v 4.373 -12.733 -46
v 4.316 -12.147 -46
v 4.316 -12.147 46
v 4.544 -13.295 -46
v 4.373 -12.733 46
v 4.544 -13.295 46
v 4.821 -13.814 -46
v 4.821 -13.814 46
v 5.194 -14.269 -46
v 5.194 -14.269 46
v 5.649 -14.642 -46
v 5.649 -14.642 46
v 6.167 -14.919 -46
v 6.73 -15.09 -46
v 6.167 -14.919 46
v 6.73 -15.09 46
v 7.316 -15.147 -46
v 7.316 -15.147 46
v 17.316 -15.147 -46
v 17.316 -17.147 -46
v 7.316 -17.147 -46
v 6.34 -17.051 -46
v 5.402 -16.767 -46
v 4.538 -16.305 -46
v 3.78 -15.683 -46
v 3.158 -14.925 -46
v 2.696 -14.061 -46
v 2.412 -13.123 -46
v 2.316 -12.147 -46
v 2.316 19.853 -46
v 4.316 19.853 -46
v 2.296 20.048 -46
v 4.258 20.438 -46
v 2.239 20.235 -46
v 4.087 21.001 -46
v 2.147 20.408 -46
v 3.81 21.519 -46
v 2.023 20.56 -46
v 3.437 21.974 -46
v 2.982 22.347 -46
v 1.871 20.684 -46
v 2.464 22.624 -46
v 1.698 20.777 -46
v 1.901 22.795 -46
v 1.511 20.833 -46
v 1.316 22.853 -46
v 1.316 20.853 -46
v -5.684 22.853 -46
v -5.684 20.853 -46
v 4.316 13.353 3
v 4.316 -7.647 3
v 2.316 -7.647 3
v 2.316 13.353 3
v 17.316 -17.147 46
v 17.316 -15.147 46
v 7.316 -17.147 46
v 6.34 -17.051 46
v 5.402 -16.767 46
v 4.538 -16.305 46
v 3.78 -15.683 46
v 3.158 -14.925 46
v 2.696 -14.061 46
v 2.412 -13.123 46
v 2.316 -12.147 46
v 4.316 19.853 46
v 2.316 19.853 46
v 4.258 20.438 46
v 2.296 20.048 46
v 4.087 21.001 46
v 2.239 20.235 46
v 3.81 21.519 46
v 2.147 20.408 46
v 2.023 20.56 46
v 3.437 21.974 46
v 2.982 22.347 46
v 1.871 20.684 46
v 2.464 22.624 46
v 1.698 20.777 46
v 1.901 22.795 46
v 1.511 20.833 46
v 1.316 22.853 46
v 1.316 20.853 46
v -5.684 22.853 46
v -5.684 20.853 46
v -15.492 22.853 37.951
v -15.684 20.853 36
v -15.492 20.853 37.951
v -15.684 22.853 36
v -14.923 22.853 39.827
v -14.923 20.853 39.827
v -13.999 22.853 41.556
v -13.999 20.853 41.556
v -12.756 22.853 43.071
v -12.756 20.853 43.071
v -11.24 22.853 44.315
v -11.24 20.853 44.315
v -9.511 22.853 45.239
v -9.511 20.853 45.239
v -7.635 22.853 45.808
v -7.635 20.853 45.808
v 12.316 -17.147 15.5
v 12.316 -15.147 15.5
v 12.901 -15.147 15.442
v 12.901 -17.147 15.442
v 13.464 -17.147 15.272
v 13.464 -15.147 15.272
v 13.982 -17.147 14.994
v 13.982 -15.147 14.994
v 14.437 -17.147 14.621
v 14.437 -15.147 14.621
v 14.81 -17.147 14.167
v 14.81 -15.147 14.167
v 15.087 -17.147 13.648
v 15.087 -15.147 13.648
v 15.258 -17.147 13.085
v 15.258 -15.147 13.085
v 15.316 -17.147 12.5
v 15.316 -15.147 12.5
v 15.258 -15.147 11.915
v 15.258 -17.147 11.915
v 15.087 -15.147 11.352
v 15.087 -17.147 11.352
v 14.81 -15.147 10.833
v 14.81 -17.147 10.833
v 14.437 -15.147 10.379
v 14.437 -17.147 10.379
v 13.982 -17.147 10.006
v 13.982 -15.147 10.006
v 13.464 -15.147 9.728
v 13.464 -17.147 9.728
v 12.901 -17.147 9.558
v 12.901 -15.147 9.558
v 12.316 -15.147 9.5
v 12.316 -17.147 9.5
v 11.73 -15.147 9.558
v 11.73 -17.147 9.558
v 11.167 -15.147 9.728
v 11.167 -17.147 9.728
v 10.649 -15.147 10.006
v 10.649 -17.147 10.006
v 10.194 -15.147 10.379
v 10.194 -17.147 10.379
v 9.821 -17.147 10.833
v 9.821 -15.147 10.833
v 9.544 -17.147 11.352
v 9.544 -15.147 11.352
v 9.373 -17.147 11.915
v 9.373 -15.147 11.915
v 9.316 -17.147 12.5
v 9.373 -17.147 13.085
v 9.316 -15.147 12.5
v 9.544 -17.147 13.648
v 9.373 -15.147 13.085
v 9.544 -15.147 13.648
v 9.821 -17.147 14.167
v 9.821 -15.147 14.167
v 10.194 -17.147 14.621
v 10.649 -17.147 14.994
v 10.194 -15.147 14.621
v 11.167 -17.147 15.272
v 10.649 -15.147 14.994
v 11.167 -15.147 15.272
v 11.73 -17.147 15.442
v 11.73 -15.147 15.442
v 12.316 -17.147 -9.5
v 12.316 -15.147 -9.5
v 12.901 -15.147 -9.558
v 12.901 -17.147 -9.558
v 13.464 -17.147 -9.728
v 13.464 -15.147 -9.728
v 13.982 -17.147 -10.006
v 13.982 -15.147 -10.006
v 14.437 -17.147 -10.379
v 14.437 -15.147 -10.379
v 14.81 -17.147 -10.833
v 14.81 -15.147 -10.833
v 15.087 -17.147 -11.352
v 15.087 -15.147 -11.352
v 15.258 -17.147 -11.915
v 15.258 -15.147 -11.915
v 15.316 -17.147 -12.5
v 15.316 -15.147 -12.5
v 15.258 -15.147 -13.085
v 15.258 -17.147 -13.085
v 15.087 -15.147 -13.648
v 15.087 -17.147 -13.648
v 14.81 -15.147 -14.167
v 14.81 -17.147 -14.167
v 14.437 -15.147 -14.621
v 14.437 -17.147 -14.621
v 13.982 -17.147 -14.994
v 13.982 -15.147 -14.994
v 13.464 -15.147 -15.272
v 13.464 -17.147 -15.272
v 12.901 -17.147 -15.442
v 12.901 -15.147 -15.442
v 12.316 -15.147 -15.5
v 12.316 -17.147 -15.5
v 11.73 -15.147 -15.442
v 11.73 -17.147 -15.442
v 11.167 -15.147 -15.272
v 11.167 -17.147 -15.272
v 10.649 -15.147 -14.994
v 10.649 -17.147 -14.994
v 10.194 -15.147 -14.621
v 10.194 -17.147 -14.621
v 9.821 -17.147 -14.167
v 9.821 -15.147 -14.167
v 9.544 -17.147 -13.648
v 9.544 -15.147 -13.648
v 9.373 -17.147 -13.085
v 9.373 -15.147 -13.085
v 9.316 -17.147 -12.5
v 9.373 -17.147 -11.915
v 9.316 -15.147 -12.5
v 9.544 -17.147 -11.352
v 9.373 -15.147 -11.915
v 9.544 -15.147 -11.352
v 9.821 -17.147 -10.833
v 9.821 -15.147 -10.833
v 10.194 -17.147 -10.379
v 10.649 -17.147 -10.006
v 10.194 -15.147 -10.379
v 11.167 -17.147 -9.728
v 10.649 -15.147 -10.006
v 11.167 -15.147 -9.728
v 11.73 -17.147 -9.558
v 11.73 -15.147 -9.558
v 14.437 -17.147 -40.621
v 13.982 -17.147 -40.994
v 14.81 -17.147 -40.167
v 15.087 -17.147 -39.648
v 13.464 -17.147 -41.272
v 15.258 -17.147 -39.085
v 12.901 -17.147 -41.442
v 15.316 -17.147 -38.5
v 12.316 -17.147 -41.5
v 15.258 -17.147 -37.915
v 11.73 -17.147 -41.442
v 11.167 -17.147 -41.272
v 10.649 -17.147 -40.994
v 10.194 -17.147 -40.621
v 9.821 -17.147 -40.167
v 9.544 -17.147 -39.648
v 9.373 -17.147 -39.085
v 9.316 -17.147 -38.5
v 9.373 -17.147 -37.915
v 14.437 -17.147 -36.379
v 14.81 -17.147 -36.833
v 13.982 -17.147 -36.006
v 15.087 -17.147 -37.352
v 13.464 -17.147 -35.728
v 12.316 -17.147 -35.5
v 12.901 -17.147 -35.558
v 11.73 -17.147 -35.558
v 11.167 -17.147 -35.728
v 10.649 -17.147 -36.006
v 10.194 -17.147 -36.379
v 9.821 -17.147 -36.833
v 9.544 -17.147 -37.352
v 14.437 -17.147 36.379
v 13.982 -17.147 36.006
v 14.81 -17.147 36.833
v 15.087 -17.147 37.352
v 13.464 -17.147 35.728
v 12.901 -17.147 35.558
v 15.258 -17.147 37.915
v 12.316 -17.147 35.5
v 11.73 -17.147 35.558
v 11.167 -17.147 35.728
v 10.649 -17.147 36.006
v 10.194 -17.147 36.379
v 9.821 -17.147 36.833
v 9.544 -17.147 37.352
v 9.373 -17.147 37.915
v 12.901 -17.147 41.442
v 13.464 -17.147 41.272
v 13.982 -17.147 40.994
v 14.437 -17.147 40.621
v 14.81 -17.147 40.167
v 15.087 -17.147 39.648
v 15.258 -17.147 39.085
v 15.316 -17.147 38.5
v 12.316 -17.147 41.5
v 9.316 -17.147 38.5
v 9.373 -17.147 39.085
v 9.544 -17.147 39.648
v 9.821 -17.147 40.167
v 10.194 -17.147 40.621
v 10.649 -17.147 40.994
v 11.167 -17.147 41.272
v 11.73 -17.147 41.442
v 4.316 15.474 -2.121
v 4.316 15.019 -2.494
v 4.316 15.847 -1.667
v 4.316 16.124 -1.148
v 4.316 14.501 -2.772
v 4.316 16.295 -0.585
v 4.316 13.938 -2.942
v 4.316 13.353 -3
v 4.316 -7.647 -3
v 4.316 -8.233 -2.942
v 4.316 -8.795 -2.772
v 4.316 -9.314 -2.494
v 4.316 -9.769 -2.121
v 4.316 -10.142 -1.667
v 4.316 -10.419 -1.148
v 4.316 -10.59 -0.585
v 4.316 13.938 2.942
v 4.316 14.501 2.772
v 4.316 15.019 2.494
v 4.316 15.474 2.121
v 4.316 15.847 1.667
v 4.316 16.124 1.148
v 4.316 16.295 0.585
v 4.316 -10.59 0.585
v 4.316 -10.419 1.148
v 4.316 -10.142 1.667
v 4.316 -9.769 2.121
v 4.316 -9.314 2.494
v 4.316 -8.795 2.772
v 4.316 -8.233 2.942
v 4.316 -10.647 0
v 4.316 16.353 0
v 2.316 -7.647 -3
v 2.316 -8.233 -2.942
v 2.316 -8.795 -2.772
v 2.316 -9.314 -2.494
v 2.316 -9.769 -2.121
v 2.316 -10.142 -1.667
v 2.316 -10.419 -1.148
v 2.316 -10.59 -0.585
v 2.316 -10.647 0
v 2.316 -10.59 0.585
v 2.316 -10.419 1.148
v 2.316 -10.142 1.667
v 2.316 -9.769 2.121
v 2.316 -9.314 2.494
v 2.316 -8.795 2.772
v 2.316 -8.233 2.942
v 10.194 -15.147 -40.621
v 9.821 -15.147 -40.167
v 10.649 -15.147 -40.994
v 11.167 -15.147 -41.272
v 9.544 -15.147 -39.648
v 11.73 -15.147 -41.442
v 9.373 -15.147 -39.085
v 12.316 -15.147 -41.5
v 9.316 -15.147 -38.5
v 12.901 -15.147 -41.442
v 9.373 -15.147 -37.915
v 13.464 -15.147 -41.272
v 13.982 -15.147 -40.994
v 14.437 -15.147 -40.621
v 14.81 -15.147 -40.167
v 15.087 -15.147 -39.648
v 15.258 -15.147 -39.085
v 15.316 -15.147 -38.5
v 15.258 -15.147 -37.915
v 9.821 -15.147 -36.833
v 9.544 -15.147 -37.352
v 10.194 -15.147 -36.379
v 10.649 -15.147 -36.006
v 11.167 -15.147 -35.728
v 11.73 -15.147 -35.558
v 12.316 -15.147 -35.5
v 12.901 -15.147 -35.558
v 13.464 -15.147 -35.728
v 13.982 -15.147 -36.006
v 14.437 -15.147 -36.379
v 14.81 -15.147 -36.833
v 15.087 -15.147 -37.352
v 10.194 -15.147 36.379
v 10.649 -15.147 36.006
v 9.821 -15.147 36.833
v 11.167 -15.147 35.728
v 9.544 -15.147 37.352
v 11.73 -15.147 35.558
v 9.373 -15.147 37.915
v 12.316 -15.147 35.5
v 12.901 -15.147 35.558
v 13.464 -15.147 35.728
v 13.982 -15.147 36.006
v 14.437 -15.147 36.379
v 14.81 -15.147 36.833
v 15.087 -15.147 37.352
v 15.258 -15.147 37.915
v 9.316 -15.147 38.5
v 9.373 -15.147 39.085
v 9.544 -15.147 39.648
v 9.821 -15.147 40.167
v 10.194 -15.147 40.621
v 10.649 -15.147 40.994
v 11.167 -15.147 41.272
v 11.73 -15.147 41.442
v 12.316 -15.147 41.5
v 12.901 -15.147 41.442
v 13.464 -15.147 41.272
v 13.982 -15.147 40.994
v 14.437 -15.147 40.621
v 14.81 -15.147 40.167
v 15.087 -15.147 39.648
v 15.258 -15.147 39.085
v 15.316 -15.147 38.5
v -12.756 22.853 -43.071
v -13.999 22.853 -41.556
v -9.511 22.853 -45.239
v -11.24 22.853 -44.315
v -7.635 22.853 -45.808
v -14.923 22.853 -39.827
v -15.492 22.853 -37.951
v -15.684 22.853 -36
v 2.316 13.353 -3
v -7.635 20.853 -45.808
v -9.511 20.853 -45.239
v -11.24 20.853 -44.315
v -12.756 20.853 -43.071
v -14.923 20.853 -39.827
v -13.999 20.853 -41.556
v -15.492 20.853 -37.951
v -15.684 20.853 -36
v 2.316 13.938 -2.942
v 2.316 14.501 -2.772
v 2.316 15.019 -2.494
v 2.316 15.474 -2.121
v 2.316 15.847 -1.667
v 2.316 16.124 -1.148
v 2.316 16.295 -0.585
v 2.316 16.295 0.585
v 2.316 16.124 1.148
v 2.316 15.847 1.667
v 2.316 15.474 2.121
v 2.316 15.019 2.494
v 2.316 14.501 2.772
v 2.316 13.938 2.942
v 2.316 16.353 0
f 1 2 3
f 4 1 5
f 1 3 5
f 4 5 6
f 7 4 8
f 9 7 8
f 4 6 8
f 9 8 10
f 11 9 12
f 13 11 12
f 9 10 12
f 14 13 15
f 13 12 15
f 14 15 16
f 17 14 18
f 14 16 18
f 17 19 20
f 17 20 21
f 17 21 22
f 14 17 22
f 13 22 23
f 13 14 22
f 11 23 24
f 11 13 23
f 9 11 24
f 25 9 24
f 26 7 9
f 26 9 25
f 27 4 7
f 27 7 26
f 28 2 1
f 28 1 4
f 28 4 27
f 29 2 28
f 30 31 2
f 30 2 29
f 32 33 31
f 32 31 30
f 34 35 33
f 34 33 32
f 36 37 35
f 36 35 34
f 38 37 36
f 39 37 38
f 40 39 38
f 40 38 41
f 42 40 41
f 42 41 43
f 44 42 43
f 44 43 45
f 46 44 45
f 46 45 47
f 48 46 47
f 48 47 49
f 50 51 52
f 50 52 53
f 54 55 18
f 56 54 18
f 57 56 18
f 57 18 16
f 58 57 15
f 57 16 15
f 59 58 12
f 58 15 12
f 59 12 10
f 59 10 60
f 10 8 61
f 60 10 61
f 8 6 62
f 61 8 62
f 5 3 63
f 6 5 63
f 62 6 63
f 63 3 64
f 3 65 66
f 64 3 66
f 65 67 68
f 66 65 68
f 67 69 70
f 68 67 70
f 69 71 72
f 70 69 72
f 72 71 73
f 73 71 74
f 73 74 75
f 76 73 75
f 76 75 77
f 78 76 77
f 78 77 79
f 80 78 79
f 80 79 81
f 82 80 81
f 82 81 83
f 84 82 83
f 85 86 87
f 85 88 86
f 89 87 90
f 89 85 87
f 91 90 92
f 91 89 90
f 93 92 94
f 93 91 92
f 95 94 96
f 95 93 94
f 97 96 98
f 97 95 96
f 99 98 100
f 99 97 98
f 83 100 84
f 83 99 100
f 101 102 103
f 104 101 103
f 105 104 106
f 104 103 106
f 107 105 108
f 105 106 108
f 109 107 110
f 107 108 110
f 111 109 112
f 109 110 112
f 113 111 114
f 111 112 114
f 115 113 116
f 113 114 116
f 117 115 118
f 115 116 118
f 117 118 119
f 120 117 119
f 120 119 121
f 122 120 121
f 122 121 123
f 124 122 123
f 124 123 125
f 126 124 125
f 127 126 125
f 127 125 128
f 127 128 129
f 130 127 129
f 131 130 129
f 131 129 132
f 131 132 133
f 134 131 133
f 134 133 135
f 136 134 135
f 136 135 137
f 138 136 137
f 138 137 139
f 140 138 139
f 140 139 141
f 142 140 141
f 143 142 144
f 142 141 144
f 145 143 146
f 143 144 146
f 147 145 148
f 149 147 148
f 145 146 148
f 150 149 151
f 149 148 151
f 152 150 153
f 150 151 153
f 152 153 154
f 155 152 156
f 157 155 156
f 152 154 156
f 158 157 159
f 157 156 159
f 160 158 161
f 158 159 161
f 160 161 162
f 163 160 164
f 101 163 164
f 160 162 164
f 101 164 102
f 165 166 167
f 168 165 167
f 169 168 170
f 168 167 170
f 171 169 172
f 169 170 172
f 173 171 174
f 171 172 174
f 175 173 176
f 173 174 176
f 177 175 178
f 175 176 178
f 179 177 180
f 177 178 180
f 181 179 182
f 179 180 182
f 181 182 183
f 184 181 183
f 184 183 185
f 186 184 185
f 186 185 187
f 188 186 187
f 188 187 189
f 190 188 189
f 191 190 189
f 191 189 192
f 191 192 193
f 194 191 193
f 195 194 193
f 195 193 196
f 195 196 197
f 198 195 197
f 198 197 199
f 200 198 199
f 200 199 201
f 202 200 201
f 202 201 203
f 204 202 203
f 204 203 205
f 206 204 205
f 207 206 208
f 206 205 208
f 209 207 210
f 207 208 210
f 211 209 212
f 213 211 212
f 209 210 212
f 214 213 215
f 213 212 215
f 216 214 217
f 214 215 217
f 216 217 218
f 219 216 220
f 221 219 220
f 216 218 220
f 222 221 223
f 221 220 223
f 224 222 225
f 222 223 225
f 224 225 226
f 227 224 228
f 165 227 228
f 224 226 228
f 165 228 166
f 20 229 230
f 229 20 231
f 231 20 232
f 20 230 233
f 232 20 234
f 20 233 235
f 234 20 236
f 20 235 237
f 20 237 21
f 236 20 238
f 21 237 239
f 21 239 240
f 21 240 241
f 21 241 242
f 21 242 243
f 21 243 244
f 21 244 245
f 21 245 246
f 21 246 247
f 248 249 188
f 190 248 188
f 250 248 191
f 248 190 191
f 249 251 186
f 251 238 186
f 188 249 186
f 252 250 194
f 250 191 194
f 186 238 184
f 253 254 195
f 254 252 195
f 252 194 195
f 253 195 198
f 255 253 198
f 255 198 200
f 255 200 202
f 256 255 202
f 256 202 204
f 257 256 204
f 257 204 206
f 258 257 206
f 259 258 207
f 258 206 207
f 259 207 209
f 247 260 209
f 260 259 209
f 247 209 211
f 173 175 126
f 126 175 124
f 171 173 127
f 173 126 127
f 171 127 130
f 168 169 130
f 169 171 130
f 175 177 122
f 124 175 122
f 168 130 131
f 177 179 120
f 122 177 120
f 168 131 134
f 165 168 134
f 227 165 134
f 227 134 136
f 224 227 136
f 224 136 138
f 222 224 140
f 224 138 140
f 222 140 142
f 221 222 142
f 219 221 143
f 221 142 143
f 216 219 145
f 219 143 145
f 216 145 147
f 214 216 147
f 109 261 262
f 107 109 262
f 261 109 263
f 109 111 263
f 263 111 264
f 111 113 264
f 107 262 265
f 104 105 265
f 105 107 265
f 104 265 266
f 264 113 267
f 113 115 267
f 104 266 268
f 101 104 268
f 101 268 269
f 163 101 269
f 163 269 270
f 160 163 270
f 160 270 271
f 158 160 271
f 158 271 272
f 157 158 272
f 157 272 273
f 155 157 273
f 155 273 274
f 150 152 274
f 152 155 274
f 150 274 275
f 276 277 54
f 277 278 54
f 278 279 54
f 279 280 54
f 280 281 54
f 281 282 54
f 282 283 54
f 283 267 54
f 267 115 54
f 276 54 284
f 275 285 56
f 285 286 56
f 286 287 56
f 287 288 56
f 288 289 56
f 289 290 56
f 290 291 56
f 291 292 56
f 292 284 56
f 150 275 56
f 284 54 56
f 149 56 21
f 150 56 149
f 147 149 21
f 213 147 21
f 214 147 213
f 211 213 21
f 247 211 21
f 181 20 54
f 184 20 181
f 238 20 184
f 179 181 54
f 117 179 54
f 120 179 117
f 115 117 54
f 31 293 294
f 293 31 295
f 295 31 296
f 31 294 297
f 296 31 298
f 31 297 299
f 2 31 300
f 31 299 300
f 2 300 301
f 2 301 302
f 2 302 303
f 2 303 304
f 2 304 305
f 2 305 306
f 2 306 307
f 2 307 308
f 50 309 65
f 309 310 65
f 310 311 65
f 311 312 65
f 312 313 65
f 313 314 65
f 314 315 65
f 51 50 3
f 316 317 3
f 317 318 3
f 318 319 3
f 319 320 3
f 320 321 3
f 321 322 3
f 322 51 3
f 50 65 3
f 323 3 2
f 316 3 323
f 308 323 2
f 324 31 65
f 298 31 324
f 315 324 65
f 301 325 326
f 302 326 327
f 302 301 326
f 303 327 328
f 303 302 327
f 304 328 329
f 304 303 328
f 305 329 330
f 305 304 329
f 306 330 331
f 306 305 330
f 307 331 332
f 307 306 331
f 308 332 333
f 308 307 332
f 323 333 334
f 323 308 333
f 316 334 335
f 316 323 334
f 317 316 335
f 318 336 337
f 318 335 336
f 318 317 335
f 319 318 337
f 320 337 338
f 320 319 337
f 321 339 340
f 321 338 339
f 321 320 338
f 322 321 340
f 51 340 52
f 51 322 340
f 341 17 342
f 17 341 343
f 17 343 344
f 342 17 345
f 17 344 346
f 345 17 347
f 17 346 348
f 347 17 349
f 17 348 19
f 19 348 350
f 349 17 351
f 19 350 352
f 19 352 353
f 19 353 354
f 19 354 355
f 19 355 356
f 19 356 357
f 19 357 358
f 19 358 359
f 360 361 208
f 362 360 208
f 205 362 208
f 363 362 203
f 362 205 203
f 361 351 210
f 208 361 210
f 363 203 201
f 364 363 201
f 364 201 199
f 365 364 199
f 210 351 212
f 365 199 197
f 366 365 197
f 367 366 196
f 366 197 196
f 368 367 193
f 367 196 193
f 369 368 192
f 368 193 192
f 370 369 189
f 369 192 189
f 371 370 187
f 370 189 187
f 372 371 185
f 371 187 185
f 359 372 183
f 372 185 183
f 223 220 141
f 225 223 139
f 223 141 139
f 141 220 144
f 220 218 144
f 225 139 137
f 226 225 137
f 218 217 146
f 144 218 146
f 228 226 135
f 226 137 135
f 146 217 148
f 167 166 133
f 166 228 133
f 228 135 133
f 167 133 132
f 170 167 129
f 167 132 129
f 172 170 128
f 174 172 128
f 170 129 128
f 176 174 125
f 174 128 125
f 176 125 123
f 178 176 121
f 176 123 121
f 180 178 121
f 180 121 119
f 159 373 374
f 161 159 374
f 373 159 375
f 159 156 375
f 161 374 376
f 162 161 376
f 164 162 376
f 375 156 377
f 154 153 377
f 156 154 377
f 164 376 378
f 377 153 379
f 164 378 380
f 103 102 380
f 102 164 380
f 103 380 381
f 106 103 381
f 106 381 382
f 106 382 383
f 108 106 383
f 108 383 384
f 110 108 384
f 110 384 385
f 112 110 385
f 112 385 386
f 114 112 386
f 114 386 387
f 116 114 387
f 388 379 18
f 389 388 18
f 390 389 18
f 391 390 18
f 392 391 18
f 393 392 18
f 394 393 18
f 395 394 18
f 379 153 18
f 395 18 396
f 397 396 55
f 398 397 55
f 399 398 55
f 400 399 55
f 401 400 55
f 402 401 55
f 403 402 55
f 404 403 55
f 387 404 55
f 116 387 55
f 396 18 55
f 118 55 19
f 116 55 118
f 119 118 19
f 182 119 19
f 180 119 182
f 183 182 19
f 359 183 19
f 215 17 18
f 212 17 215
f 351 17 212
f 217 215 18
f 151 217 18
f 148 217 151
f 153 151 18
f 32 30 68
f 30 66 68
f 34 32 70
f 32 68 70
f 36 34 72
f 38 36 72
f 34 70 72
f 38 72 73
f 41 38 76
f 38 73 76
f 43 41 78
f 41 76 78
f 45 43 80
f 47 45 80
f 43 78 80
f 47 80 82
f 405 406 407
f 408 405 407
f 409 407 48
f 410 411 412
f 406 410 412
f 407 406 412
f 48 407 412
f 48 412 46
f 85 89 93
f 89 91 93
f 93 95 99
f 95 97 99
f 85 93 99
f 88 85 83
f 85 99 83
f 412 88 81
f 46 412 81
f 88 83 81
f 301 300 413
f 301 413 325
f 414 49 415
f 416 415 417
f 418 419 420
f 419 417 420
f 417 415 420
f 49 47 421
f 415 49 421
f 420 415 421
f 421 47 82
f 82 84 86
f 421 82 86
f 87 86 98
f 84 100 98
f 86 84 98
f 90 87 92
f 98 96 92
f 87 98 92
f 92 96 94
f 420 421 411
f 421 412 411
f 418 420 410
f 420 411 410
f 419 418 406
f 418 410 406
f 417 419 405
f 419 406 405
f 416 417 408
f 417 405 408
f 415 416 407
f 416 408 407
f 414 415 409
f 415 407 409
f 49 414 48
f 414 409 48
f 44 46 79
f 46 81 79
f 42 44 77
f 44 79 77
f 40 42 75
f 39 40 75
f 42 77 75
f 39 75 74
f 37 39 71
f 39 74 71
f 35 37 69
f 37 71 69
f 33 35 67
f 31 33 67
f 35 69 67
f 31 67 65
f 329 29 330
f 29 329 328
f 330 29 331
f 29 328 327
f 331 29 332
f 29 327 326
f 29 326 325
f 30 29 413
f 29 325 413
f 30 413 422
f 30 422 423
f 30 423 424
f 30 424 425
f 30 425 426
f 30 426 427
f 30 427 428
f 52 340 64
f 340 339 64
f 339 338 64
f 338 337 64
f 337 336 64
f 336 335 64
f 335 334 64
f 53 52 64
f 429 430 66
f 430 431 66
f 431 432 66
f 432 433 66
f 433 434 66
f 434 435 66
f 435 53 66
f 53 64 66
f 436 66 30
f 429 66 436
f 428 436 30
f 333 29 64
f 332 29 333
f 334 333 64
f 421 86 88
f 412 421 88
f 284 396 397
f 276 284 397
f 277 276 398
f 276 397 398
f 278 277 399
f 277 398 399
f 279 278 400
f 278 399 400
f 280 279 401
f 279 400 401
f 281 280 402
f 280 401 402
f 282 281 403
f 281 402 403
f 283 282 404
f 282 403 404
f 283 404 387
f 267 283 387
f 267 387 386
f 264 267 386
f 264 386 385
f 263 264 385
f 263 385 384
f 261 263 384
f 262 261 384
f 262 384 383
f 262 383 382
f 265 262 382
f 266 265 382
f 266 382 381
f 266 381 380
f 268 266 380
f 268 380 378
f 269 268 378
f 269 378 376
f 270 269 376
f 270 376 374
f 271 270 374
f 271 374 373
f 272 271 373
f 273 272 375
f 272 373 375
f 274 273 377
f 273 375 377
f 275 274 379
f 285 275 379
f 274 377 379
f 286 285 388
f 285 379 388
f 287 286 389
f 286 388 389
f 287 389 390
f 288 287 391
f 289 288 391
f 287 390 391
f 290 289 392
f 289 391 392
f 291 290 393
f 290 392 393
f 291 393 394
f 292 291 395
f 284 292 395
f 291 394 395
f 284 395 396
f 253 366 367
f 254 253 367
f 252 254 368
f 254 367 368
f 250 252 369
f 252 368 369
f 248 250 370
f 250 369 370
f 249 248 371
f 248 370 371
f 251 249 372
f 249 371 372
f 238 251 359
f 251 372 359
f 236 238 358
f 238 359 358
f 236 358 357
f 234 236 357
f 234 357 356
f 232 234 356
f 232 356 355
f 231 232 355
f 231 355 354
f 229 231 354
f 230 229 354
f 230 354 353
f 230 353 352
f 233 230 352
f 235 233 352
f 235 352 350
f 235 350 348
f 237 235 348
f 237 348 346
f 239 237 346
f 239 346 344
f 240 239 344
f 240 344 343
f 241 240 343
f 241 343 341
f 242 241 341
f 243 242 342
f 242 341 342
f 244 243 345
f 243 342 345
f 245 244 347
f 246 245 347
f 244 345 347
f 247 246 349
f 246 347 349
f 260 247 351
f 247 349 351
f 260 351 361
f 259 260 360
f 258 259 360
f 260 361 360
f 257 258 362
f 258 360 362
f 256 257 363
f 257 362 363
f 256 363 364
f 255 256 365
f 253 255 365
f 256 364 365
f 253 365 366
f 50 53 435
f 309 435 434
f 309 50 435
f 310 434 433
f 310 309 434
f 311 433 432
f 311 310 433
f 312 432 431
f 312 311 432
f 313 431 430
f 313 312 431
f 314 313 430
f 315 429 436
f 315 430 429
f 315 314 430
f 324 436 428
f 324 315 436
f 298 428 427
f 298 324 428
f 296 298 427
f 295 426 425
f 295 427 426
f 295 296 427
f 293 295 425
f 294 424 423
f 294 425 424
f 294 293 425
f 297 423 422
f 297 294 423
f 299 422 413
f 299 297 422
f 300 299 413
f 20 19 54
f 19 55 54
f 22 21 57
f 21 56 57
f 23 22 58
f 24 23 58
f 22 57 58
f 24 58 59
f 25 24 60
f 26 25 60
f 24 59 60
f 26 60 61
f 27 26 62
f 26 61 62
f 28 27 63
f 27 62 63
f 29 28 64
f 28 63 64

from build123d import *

# Parameters (mm, degrees)
EXTRUDE_1_DEPTH     = 46
SKETCH_2_R          = 3
CUT_EXTRUDE_1_DEPTH = 10
CUT_EXTRUDE_2_DEPTH = 10
FILLET_1_R          = 10


with BuildPart() as part:
    # 草图1 → 拉伸-薄壁1 (new, symmetric)
    with BuildSketch(Plane.XY):
        with BuildLine():
            Line((-15.684450605, 22.852628588), (1.315549395, 22.852628588))
            ThreePointArc((1.315549395, 22.852628588), (3.436869738, 21.973948932), (4.315549395, 19.852628588))
            Line((4.315549395, 19.852628588), (4.315549395, -12.147371412))
            ThreePointArc((4.315549395, -12.147371412), (5.194229051, -14.268691755), (7.315549395, -15.147371412))
            Line((7.315549395, -15.147371412), (17.315549395, -15.147371412))
            Line((17.315549395, -15.147371412), (17.315549395, -17.147371412))
            Line((17.315549395, -17.147371412), (7.315549395, -17.147371412))
            ThreePointArc((7.315549395, -17.147371412), (3.780015489, -15.682905318), (2.315549395, -12.147371412))
            Line((2.315549395, -12.147371412), (2.315549395, 19.852628588))
            ThreePointArc((2.315549395, 19.852628588), (2.022656176, 20.55973537), (1.315549395, 20.852628588))
            Line((1.315549395, 20.852628588), (-15.684450605, 20.852628588))
            Line((-15.684450605, 20.852628588), (-15.684450605, 22.852628588))
        make_face()
    extrude(amount=EXTRUDE_1_DEPTH, both=True)

    # 草图2 → 切除-拉伸1 (cut)
    with BuildSketch(Plane(origin=(0, -15.147371412, 0), x_dir=(1, 0, 0), z_dir=(0, 1, 0))):
        with Locations(Location((12.315549395, -38.5, 0), (0, 0, 270))):
            Circle(SKETCH_2_R)
        with Locations(Location((12.315549395, -12.5, 0), (0, 0, 270))):
            Circle(SKETCH_2_R)
        with Locations(Location((12.315549395, 12.5, 0), (0, 0, 270))):
            Circle(SKETCH_2_R)
        with Locations(Location((12.315549395, 38.5, 0), (0, 0, 270))):
            Circle(SKETCH_2_R)
    extrude(amount=-CUT_EXTRUDE_1_DEPTH, mode=Mode.SUBTRACT)

    # 草图3 → 切除-拉伸2 (cut)
    with BuildSketch(Plane(origin=(4.315549395, 0, 0), x_dir=(0, 0, -1), z_dir=(1, 0, 0))):
        with BuildLine():
            Line((-3, -7.647371412), (-3, 13.352628588))
            ThreePointArc((-3, 13.352628588), (0, 16.352628588), (3, 13.352628588))
            Line((3, 13.352628588), (3, -7.647371412))
            ThreePointArc((3, -7.647371412), (0, -10.647371412), (-3, -7.647371412))
        make_face()
    extrude(amount=-CUT_EXTRUDE_2_DEPTH, mode=Mode.SUBTRACT)

    # 圆角1
    fillet_1_edges = [part.edges().sort_by_distance(p)[0] for p in [
        (-15.684450605, 21.852628588, -46),
        (-15.684450605, 21.852628588, 46),
    ]]
    fillet(fillet_1_edges, radius=FILLET_1_R)


solid = part.part
